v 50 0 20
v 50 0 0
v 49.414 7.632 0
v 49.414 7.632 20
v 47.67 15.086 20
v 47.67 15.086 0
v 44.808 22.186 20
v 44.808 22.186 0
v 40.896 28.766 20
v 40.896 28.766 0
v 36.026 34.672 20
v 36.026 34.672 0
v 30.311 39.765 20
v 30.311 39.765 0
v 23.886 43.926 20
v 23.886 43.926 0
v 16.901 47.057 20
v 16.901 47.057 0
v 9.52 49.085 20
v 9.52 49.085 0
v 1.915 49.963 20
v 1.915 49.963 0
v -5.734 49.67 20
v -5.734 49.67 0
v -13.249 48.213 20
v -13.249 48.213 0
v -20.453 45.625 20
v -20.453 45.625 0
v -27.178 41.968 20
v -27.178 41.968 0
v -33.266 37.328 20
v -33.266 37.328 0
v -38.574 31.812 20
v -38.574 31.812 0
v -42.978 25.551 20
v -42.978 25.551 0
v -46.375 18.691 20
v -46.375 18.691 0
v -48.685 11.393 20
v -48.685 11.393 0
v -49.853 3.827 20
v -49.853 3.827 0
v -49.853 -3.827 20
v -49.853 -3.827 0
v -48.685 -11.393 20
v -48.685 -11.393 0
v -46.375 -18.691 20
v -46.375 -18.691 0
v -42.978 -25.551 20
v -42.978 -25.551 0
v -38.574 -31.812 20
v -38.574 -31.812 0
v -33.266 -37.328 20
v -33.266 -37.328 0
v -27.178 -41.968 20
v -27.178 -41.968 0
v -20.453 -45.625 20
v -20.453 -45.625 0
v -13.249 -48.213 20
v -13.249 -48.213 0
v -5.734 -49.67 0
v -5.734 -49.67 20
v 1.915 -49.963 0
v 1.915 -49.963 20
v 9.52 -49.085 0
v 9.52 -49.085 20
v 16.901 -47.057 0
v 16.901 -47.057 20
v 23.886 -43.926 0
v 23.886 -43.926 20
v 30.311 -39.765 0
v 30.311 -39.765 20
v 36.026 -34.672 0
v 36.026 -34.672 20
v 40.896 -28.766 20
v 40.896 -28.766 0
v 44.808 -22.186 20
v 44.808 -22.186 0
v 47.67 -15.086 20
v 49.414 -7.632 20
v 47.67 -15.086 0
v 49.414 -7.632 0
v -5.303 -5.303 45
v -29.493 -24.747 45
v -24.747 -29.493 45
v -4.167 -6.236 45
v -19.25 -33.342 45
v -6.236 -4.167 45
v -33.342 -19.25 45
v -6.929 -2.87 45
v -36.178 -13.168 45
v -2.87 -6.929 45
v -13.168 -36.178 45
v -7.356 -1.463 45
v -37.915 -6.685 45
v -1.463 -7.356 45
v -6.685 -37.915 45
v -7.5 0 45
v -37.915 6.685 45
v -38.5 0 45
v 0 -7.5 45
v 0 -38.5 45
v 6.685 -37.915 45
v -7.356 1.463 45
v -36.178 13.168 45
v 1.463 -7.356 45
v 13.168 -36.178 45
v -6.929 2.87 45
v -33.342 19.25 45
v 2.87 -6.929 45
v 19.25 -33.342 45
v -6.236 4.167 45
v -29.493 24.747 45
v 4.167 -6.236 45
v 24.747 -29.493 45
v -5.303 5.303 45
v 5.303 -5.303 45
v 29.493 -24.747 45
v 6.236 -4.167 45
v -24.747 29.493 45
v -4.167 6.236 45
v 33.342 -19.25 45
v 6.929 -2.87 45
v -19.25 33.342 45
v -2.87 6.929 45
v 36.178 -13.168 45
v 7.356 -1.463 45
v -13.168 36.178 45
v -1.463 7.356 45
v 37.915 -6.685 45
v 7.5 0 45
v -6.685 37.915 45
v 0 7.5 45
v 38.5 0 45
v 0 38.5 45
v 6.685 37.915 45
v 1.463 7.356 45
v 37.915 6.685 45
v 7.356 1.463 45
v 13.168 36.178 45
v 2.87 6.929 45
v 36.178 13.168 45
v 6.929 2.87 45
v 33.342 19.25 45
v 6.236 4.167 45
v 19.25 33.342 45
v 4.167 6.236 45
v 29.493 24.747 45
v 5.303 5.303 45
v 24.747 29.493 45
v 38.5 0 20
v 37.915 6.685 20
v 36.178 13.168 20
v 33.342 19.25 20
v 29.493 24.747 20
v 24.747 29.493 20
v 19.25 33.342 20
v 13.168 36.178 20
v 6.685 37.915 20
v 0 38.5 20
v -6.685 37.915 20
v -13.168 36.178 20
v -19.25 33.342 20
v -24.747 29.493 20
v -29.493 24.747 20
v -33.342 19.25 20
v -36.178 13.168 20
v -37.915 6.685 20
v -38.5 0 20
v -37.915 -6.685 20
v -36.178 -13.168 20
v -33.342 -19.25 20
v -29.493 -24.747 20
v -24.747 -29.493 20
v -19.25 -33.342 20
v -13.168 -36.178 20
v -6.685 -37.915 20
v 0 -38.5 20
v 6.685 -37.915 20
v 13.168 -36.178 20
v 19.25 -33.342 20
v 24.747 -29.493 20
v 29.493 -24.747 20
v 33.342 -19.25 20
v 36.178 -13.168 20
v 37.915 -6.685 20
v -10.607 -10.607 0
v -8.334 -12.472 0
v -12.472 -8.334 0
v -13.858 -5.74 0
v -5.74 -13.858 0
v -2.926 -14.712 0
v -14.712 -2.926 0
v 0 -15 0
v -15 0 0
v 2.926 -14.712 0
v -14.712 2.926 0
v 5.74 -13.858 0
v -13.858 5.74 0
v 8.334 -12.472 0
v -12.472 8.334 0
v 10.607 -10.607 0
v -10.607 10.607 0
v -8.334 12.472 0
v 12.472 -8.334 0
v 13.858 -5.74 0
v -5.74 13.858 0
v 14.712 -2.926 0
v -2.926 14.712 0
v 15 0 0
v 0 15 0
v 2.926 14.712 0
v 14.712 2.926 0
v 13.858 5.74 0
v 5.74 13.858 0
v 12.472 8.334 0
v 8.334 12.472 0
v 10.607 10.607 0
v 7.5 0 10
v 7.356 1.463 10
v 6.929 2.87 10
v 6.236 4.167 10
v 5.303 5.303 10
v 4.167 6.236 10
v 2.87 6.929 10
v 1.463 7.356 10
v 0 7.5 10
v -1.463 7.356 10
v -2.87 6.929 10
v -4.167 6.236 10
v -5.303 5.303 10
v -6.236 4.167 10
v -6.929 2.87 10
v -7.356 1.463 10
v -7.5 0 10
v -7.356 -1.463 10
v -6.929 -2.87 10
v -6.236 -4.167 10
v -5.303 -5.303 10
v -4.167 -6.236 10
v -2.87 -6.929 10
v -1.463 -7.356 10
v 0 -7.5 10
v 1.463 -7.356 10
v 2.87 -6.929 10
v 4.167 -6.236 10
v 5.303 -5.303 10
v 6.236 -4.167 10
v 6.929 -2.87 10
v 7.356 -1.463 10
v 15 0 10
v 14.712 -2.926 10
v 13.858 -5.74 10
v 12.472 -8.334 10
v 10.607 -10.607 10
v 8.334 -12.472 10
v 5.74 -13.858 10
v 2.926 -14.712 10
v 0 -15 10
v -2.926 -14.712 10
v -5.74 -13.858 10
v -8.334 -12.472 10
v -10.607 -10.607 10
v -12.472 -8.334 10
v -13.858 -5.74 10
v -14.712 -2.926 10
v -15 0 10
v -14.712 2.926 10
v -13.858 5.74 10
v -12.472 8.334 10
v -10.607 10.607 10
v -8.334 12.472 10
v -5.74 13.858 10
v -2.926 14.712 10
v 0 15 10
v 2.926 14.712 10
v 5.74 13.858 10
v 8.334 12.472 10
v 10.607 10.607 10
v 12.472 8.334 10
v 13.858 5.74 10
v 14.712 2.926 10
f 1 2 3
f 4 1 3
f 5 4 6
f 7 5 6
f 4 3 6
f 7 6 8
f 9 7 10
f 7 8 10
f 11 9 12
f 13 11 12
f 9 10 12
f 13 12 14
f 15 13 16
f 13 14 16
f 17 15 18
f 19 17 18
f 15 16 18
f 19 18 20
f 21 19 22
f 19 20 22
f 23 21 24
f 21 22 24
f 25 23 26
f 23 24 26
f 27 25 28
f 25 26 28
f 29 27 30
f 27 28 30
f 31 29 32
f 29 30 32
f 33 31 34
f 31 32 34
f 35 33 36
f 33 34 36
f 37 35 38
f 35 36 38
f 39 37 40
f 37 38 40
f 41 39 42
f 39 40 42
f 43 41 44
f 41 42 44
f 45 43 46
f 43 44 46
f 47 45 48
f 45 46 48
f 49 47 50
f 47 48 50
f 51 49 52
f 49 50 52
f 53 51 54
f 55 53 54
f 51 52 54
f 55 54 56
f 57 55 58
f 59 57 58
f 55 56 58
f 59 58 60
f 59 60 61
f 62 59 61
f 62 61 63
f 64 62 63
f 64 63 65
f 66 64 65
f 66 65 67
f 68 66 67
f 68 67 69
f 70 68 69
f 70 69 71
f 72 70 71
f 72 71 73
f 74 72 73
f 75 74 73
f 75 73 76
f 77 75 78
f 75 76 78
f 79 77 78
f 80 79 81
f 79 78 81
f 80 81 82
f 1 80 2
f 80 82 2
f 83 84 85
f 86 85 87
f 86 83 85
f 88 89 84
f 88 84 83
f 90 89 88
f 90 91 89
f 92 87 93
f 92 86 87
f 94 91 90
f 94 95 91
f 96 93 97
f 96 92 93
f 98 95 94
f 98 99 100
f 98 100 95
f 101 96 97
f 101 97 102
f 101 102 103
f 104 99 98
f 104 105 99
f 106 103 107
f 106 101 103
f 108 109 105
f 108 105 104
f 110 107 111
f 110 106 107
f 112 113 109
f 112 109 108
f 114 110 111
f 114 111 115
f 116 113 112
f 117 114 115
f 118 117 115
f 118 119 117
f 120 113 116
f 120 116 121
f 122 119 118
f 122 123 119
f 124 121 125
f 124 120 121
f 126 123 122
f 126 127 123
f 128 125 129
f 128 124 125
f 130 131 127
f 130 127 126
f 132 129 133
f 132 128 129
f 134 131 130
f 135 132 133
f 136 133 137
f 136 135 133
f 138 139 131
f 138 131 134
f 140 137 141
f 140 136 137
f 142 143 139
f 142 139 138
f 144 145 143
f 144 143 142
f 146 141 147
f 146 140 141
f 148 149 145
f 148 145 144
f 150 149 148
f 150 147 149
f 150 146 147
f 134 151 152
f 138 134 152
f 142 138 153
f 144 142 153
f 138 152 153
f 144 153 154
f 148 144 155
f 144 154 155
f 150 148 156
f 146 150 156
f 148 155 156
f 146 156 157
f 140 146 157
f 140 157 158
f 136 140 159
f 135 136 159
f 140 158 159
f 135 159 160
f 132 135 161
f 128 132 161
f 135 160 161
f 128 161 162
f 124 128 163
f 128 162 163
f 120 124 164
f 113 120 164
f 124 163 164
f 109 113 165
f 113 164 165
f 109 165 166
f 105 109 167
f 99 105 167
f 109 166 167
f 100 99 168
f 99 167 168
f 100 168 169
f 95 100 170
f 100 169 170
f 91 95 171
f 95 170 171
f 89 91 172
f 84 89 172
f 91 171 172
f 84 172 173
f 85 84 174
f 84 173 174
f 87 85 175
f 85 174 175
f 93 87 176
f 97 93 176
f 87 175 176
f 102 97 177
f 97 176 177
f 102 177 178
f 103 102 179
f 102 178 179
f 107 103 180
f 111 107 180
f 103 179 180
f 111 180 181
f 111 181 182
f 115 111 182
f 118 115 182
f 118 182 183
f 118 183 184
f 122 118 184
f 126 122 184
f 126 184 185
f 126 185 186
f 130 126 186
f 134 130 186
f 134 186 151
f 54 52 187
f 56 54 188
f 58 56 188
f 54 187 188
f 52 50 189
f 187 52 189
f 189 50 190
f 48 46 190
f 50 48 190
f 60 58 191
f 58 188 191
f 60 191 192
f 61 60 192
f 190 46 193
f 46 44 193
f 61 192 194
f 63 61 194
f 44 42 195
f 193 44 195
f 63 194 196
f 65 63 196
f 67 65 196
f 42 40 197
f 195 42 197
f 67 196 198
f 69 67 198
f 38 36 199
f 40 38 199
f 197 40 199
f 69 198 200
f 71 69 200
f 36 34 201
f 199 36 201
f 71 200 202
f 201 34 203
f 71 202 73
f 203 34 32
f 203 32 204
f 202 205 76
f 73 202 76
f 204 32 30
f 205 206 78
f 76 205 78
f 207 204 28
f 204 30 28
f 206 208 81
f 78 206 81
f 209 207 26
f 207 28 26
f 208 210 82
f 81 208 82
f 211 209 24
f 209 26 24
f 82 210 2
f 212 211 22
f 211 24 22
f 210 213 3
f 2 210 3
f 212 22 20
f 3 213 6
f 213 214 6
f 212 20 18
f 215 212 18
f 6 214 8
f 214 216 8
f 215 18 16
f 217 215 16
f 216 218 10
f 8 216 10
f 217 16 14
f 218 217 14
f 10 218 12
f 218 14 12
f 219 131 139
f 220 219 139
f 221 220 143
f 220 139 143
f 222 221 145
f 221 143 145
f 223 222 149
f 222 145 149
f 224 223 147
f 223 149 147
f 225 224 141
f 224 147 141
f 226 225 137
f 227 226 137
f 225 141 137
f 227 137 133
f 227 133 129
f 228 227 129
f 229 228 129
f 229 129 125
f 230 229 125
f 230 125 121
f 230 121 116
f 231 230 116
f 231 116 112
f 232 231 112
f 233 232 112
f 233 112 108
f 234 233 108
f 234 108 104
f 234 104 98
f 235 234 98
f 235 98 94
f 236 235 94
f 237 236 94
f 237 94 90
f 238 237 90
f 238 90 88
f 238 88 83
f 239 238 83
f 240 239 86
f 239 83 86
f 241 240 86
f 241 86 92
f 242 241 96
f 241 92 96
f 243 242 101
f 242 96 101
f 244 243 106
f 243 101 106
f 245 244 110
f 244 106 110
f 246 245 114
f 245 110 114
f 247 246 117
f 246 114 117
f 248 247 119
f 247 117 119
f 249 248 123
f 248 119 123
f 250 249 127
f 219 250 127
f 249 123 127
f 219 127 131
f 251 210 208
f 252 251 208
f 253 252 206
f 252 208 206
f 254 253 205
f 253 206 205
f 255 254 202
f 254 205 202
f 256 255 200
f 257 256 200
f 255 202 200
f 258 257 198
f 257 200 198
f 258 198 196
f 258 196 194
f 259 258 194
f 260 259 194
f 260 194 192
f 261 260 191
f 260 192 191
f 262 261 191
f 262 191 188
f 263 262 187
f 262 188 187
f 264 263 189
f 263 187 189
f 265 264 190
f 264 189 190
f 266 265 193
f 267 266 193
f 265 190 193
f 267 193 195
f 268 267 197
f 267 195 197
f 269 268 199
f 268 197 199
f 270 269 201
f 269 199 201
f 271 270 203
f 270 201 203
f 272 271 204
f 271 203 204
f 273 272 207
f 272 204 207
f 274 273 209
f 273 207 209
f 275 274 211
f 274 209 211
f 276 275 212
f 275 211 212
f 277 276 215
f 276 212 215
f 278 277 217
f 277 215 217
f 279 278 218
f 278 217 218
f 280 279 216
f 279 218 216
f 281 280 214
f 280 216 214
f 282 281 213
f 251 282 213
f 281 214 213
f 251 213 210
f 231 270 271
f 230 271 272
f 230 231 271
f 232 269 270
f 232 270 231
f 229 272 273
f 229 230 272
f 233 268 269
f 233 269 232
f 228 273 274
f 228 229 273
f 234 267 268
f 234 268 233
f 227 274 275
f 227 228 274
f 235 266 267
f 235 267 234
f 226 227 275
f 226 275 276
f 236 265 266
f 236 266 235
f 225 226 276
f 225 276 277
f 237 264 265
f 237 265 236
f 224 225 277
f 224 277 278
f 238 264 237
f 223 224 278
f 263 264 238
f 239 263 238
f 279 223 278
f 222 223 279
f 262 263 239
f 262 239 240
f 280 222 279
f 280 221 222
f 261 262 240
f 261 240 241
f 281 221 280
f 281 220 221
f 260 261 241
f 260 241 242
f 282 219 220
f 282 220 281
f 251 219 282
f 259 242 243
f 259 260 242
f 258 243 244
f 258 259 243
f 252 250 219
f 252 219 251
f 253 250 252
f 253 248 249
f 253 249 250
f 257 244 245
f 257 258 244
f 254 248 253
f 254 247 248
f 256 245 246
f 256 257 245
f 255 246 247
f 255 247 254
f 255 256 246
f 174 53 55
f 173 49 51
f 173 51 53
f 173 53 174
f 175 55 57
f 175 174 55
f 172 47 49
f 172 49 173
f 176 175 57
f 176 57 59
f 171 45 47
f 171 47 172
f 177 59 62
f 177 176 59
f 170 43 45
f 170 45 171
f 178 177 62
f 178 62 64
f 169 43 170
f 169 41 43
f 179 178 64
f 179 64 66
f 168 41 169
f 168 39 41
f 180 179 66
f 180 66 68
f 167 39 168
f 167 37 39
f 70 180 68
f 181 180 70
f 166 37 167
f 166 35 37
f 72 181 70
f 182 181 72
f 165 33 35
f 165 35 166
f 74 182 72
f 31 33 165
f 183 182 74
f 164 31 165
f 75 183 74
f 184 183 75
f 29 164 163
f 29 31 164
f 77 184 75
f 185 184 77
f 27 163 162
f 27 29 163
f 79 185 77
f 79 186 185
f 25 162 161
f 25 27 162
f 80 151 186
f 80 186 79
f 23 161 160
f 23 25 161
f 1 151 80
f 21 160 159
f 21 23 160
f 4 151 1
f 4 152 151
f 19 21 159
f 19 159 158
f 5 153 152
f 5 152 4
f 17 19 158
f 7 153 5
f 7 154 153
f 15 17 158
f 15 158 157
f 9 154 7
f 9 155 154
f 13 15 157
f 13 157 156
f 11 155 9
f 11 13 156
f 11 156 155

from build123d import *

# Parameters (mm, degrees)
F0_R     = 50
F1_DEPTH = 20
F2_R     = 38.5
F3_DEPTH = 25
F5_R     = 7.5
F6_DEPTH = 50
F7_R     = 15
F8_DEPTH = 10


with BuildPart() as f1:
    # F0 (on Top) → F1 (new body)
    with BuildSketch(Plane.XY):
        Circle(F0_R)
    extrude(amount=F1_DEPTH)

    # F2 (on face) → F3 (join)
    with BuildSketch(Plane.XY.offset(20)):
        Circle(F2_R)
    extrude(amount=F3_DEPTH)

    # F5 (on face) → F6 (cut)
    with BuildSketch(Plane.XY.offset(45)):
        Circle(F5_R)
    extrude(amount=-F6_DEPTH, mode=Mode.SUBTRACT)

    # F7 (on face) → F8 (cut)
    with BuildSketch(Plane(origin=(0, 0, 0), x_dir=(1, 0, 0), z_dir=(0, 0, -1))):
        Circle(F7_R)
    extrude(amount=-F8_DEPTH, mode=Mode.SUBTRACT)


solid = f1.part
